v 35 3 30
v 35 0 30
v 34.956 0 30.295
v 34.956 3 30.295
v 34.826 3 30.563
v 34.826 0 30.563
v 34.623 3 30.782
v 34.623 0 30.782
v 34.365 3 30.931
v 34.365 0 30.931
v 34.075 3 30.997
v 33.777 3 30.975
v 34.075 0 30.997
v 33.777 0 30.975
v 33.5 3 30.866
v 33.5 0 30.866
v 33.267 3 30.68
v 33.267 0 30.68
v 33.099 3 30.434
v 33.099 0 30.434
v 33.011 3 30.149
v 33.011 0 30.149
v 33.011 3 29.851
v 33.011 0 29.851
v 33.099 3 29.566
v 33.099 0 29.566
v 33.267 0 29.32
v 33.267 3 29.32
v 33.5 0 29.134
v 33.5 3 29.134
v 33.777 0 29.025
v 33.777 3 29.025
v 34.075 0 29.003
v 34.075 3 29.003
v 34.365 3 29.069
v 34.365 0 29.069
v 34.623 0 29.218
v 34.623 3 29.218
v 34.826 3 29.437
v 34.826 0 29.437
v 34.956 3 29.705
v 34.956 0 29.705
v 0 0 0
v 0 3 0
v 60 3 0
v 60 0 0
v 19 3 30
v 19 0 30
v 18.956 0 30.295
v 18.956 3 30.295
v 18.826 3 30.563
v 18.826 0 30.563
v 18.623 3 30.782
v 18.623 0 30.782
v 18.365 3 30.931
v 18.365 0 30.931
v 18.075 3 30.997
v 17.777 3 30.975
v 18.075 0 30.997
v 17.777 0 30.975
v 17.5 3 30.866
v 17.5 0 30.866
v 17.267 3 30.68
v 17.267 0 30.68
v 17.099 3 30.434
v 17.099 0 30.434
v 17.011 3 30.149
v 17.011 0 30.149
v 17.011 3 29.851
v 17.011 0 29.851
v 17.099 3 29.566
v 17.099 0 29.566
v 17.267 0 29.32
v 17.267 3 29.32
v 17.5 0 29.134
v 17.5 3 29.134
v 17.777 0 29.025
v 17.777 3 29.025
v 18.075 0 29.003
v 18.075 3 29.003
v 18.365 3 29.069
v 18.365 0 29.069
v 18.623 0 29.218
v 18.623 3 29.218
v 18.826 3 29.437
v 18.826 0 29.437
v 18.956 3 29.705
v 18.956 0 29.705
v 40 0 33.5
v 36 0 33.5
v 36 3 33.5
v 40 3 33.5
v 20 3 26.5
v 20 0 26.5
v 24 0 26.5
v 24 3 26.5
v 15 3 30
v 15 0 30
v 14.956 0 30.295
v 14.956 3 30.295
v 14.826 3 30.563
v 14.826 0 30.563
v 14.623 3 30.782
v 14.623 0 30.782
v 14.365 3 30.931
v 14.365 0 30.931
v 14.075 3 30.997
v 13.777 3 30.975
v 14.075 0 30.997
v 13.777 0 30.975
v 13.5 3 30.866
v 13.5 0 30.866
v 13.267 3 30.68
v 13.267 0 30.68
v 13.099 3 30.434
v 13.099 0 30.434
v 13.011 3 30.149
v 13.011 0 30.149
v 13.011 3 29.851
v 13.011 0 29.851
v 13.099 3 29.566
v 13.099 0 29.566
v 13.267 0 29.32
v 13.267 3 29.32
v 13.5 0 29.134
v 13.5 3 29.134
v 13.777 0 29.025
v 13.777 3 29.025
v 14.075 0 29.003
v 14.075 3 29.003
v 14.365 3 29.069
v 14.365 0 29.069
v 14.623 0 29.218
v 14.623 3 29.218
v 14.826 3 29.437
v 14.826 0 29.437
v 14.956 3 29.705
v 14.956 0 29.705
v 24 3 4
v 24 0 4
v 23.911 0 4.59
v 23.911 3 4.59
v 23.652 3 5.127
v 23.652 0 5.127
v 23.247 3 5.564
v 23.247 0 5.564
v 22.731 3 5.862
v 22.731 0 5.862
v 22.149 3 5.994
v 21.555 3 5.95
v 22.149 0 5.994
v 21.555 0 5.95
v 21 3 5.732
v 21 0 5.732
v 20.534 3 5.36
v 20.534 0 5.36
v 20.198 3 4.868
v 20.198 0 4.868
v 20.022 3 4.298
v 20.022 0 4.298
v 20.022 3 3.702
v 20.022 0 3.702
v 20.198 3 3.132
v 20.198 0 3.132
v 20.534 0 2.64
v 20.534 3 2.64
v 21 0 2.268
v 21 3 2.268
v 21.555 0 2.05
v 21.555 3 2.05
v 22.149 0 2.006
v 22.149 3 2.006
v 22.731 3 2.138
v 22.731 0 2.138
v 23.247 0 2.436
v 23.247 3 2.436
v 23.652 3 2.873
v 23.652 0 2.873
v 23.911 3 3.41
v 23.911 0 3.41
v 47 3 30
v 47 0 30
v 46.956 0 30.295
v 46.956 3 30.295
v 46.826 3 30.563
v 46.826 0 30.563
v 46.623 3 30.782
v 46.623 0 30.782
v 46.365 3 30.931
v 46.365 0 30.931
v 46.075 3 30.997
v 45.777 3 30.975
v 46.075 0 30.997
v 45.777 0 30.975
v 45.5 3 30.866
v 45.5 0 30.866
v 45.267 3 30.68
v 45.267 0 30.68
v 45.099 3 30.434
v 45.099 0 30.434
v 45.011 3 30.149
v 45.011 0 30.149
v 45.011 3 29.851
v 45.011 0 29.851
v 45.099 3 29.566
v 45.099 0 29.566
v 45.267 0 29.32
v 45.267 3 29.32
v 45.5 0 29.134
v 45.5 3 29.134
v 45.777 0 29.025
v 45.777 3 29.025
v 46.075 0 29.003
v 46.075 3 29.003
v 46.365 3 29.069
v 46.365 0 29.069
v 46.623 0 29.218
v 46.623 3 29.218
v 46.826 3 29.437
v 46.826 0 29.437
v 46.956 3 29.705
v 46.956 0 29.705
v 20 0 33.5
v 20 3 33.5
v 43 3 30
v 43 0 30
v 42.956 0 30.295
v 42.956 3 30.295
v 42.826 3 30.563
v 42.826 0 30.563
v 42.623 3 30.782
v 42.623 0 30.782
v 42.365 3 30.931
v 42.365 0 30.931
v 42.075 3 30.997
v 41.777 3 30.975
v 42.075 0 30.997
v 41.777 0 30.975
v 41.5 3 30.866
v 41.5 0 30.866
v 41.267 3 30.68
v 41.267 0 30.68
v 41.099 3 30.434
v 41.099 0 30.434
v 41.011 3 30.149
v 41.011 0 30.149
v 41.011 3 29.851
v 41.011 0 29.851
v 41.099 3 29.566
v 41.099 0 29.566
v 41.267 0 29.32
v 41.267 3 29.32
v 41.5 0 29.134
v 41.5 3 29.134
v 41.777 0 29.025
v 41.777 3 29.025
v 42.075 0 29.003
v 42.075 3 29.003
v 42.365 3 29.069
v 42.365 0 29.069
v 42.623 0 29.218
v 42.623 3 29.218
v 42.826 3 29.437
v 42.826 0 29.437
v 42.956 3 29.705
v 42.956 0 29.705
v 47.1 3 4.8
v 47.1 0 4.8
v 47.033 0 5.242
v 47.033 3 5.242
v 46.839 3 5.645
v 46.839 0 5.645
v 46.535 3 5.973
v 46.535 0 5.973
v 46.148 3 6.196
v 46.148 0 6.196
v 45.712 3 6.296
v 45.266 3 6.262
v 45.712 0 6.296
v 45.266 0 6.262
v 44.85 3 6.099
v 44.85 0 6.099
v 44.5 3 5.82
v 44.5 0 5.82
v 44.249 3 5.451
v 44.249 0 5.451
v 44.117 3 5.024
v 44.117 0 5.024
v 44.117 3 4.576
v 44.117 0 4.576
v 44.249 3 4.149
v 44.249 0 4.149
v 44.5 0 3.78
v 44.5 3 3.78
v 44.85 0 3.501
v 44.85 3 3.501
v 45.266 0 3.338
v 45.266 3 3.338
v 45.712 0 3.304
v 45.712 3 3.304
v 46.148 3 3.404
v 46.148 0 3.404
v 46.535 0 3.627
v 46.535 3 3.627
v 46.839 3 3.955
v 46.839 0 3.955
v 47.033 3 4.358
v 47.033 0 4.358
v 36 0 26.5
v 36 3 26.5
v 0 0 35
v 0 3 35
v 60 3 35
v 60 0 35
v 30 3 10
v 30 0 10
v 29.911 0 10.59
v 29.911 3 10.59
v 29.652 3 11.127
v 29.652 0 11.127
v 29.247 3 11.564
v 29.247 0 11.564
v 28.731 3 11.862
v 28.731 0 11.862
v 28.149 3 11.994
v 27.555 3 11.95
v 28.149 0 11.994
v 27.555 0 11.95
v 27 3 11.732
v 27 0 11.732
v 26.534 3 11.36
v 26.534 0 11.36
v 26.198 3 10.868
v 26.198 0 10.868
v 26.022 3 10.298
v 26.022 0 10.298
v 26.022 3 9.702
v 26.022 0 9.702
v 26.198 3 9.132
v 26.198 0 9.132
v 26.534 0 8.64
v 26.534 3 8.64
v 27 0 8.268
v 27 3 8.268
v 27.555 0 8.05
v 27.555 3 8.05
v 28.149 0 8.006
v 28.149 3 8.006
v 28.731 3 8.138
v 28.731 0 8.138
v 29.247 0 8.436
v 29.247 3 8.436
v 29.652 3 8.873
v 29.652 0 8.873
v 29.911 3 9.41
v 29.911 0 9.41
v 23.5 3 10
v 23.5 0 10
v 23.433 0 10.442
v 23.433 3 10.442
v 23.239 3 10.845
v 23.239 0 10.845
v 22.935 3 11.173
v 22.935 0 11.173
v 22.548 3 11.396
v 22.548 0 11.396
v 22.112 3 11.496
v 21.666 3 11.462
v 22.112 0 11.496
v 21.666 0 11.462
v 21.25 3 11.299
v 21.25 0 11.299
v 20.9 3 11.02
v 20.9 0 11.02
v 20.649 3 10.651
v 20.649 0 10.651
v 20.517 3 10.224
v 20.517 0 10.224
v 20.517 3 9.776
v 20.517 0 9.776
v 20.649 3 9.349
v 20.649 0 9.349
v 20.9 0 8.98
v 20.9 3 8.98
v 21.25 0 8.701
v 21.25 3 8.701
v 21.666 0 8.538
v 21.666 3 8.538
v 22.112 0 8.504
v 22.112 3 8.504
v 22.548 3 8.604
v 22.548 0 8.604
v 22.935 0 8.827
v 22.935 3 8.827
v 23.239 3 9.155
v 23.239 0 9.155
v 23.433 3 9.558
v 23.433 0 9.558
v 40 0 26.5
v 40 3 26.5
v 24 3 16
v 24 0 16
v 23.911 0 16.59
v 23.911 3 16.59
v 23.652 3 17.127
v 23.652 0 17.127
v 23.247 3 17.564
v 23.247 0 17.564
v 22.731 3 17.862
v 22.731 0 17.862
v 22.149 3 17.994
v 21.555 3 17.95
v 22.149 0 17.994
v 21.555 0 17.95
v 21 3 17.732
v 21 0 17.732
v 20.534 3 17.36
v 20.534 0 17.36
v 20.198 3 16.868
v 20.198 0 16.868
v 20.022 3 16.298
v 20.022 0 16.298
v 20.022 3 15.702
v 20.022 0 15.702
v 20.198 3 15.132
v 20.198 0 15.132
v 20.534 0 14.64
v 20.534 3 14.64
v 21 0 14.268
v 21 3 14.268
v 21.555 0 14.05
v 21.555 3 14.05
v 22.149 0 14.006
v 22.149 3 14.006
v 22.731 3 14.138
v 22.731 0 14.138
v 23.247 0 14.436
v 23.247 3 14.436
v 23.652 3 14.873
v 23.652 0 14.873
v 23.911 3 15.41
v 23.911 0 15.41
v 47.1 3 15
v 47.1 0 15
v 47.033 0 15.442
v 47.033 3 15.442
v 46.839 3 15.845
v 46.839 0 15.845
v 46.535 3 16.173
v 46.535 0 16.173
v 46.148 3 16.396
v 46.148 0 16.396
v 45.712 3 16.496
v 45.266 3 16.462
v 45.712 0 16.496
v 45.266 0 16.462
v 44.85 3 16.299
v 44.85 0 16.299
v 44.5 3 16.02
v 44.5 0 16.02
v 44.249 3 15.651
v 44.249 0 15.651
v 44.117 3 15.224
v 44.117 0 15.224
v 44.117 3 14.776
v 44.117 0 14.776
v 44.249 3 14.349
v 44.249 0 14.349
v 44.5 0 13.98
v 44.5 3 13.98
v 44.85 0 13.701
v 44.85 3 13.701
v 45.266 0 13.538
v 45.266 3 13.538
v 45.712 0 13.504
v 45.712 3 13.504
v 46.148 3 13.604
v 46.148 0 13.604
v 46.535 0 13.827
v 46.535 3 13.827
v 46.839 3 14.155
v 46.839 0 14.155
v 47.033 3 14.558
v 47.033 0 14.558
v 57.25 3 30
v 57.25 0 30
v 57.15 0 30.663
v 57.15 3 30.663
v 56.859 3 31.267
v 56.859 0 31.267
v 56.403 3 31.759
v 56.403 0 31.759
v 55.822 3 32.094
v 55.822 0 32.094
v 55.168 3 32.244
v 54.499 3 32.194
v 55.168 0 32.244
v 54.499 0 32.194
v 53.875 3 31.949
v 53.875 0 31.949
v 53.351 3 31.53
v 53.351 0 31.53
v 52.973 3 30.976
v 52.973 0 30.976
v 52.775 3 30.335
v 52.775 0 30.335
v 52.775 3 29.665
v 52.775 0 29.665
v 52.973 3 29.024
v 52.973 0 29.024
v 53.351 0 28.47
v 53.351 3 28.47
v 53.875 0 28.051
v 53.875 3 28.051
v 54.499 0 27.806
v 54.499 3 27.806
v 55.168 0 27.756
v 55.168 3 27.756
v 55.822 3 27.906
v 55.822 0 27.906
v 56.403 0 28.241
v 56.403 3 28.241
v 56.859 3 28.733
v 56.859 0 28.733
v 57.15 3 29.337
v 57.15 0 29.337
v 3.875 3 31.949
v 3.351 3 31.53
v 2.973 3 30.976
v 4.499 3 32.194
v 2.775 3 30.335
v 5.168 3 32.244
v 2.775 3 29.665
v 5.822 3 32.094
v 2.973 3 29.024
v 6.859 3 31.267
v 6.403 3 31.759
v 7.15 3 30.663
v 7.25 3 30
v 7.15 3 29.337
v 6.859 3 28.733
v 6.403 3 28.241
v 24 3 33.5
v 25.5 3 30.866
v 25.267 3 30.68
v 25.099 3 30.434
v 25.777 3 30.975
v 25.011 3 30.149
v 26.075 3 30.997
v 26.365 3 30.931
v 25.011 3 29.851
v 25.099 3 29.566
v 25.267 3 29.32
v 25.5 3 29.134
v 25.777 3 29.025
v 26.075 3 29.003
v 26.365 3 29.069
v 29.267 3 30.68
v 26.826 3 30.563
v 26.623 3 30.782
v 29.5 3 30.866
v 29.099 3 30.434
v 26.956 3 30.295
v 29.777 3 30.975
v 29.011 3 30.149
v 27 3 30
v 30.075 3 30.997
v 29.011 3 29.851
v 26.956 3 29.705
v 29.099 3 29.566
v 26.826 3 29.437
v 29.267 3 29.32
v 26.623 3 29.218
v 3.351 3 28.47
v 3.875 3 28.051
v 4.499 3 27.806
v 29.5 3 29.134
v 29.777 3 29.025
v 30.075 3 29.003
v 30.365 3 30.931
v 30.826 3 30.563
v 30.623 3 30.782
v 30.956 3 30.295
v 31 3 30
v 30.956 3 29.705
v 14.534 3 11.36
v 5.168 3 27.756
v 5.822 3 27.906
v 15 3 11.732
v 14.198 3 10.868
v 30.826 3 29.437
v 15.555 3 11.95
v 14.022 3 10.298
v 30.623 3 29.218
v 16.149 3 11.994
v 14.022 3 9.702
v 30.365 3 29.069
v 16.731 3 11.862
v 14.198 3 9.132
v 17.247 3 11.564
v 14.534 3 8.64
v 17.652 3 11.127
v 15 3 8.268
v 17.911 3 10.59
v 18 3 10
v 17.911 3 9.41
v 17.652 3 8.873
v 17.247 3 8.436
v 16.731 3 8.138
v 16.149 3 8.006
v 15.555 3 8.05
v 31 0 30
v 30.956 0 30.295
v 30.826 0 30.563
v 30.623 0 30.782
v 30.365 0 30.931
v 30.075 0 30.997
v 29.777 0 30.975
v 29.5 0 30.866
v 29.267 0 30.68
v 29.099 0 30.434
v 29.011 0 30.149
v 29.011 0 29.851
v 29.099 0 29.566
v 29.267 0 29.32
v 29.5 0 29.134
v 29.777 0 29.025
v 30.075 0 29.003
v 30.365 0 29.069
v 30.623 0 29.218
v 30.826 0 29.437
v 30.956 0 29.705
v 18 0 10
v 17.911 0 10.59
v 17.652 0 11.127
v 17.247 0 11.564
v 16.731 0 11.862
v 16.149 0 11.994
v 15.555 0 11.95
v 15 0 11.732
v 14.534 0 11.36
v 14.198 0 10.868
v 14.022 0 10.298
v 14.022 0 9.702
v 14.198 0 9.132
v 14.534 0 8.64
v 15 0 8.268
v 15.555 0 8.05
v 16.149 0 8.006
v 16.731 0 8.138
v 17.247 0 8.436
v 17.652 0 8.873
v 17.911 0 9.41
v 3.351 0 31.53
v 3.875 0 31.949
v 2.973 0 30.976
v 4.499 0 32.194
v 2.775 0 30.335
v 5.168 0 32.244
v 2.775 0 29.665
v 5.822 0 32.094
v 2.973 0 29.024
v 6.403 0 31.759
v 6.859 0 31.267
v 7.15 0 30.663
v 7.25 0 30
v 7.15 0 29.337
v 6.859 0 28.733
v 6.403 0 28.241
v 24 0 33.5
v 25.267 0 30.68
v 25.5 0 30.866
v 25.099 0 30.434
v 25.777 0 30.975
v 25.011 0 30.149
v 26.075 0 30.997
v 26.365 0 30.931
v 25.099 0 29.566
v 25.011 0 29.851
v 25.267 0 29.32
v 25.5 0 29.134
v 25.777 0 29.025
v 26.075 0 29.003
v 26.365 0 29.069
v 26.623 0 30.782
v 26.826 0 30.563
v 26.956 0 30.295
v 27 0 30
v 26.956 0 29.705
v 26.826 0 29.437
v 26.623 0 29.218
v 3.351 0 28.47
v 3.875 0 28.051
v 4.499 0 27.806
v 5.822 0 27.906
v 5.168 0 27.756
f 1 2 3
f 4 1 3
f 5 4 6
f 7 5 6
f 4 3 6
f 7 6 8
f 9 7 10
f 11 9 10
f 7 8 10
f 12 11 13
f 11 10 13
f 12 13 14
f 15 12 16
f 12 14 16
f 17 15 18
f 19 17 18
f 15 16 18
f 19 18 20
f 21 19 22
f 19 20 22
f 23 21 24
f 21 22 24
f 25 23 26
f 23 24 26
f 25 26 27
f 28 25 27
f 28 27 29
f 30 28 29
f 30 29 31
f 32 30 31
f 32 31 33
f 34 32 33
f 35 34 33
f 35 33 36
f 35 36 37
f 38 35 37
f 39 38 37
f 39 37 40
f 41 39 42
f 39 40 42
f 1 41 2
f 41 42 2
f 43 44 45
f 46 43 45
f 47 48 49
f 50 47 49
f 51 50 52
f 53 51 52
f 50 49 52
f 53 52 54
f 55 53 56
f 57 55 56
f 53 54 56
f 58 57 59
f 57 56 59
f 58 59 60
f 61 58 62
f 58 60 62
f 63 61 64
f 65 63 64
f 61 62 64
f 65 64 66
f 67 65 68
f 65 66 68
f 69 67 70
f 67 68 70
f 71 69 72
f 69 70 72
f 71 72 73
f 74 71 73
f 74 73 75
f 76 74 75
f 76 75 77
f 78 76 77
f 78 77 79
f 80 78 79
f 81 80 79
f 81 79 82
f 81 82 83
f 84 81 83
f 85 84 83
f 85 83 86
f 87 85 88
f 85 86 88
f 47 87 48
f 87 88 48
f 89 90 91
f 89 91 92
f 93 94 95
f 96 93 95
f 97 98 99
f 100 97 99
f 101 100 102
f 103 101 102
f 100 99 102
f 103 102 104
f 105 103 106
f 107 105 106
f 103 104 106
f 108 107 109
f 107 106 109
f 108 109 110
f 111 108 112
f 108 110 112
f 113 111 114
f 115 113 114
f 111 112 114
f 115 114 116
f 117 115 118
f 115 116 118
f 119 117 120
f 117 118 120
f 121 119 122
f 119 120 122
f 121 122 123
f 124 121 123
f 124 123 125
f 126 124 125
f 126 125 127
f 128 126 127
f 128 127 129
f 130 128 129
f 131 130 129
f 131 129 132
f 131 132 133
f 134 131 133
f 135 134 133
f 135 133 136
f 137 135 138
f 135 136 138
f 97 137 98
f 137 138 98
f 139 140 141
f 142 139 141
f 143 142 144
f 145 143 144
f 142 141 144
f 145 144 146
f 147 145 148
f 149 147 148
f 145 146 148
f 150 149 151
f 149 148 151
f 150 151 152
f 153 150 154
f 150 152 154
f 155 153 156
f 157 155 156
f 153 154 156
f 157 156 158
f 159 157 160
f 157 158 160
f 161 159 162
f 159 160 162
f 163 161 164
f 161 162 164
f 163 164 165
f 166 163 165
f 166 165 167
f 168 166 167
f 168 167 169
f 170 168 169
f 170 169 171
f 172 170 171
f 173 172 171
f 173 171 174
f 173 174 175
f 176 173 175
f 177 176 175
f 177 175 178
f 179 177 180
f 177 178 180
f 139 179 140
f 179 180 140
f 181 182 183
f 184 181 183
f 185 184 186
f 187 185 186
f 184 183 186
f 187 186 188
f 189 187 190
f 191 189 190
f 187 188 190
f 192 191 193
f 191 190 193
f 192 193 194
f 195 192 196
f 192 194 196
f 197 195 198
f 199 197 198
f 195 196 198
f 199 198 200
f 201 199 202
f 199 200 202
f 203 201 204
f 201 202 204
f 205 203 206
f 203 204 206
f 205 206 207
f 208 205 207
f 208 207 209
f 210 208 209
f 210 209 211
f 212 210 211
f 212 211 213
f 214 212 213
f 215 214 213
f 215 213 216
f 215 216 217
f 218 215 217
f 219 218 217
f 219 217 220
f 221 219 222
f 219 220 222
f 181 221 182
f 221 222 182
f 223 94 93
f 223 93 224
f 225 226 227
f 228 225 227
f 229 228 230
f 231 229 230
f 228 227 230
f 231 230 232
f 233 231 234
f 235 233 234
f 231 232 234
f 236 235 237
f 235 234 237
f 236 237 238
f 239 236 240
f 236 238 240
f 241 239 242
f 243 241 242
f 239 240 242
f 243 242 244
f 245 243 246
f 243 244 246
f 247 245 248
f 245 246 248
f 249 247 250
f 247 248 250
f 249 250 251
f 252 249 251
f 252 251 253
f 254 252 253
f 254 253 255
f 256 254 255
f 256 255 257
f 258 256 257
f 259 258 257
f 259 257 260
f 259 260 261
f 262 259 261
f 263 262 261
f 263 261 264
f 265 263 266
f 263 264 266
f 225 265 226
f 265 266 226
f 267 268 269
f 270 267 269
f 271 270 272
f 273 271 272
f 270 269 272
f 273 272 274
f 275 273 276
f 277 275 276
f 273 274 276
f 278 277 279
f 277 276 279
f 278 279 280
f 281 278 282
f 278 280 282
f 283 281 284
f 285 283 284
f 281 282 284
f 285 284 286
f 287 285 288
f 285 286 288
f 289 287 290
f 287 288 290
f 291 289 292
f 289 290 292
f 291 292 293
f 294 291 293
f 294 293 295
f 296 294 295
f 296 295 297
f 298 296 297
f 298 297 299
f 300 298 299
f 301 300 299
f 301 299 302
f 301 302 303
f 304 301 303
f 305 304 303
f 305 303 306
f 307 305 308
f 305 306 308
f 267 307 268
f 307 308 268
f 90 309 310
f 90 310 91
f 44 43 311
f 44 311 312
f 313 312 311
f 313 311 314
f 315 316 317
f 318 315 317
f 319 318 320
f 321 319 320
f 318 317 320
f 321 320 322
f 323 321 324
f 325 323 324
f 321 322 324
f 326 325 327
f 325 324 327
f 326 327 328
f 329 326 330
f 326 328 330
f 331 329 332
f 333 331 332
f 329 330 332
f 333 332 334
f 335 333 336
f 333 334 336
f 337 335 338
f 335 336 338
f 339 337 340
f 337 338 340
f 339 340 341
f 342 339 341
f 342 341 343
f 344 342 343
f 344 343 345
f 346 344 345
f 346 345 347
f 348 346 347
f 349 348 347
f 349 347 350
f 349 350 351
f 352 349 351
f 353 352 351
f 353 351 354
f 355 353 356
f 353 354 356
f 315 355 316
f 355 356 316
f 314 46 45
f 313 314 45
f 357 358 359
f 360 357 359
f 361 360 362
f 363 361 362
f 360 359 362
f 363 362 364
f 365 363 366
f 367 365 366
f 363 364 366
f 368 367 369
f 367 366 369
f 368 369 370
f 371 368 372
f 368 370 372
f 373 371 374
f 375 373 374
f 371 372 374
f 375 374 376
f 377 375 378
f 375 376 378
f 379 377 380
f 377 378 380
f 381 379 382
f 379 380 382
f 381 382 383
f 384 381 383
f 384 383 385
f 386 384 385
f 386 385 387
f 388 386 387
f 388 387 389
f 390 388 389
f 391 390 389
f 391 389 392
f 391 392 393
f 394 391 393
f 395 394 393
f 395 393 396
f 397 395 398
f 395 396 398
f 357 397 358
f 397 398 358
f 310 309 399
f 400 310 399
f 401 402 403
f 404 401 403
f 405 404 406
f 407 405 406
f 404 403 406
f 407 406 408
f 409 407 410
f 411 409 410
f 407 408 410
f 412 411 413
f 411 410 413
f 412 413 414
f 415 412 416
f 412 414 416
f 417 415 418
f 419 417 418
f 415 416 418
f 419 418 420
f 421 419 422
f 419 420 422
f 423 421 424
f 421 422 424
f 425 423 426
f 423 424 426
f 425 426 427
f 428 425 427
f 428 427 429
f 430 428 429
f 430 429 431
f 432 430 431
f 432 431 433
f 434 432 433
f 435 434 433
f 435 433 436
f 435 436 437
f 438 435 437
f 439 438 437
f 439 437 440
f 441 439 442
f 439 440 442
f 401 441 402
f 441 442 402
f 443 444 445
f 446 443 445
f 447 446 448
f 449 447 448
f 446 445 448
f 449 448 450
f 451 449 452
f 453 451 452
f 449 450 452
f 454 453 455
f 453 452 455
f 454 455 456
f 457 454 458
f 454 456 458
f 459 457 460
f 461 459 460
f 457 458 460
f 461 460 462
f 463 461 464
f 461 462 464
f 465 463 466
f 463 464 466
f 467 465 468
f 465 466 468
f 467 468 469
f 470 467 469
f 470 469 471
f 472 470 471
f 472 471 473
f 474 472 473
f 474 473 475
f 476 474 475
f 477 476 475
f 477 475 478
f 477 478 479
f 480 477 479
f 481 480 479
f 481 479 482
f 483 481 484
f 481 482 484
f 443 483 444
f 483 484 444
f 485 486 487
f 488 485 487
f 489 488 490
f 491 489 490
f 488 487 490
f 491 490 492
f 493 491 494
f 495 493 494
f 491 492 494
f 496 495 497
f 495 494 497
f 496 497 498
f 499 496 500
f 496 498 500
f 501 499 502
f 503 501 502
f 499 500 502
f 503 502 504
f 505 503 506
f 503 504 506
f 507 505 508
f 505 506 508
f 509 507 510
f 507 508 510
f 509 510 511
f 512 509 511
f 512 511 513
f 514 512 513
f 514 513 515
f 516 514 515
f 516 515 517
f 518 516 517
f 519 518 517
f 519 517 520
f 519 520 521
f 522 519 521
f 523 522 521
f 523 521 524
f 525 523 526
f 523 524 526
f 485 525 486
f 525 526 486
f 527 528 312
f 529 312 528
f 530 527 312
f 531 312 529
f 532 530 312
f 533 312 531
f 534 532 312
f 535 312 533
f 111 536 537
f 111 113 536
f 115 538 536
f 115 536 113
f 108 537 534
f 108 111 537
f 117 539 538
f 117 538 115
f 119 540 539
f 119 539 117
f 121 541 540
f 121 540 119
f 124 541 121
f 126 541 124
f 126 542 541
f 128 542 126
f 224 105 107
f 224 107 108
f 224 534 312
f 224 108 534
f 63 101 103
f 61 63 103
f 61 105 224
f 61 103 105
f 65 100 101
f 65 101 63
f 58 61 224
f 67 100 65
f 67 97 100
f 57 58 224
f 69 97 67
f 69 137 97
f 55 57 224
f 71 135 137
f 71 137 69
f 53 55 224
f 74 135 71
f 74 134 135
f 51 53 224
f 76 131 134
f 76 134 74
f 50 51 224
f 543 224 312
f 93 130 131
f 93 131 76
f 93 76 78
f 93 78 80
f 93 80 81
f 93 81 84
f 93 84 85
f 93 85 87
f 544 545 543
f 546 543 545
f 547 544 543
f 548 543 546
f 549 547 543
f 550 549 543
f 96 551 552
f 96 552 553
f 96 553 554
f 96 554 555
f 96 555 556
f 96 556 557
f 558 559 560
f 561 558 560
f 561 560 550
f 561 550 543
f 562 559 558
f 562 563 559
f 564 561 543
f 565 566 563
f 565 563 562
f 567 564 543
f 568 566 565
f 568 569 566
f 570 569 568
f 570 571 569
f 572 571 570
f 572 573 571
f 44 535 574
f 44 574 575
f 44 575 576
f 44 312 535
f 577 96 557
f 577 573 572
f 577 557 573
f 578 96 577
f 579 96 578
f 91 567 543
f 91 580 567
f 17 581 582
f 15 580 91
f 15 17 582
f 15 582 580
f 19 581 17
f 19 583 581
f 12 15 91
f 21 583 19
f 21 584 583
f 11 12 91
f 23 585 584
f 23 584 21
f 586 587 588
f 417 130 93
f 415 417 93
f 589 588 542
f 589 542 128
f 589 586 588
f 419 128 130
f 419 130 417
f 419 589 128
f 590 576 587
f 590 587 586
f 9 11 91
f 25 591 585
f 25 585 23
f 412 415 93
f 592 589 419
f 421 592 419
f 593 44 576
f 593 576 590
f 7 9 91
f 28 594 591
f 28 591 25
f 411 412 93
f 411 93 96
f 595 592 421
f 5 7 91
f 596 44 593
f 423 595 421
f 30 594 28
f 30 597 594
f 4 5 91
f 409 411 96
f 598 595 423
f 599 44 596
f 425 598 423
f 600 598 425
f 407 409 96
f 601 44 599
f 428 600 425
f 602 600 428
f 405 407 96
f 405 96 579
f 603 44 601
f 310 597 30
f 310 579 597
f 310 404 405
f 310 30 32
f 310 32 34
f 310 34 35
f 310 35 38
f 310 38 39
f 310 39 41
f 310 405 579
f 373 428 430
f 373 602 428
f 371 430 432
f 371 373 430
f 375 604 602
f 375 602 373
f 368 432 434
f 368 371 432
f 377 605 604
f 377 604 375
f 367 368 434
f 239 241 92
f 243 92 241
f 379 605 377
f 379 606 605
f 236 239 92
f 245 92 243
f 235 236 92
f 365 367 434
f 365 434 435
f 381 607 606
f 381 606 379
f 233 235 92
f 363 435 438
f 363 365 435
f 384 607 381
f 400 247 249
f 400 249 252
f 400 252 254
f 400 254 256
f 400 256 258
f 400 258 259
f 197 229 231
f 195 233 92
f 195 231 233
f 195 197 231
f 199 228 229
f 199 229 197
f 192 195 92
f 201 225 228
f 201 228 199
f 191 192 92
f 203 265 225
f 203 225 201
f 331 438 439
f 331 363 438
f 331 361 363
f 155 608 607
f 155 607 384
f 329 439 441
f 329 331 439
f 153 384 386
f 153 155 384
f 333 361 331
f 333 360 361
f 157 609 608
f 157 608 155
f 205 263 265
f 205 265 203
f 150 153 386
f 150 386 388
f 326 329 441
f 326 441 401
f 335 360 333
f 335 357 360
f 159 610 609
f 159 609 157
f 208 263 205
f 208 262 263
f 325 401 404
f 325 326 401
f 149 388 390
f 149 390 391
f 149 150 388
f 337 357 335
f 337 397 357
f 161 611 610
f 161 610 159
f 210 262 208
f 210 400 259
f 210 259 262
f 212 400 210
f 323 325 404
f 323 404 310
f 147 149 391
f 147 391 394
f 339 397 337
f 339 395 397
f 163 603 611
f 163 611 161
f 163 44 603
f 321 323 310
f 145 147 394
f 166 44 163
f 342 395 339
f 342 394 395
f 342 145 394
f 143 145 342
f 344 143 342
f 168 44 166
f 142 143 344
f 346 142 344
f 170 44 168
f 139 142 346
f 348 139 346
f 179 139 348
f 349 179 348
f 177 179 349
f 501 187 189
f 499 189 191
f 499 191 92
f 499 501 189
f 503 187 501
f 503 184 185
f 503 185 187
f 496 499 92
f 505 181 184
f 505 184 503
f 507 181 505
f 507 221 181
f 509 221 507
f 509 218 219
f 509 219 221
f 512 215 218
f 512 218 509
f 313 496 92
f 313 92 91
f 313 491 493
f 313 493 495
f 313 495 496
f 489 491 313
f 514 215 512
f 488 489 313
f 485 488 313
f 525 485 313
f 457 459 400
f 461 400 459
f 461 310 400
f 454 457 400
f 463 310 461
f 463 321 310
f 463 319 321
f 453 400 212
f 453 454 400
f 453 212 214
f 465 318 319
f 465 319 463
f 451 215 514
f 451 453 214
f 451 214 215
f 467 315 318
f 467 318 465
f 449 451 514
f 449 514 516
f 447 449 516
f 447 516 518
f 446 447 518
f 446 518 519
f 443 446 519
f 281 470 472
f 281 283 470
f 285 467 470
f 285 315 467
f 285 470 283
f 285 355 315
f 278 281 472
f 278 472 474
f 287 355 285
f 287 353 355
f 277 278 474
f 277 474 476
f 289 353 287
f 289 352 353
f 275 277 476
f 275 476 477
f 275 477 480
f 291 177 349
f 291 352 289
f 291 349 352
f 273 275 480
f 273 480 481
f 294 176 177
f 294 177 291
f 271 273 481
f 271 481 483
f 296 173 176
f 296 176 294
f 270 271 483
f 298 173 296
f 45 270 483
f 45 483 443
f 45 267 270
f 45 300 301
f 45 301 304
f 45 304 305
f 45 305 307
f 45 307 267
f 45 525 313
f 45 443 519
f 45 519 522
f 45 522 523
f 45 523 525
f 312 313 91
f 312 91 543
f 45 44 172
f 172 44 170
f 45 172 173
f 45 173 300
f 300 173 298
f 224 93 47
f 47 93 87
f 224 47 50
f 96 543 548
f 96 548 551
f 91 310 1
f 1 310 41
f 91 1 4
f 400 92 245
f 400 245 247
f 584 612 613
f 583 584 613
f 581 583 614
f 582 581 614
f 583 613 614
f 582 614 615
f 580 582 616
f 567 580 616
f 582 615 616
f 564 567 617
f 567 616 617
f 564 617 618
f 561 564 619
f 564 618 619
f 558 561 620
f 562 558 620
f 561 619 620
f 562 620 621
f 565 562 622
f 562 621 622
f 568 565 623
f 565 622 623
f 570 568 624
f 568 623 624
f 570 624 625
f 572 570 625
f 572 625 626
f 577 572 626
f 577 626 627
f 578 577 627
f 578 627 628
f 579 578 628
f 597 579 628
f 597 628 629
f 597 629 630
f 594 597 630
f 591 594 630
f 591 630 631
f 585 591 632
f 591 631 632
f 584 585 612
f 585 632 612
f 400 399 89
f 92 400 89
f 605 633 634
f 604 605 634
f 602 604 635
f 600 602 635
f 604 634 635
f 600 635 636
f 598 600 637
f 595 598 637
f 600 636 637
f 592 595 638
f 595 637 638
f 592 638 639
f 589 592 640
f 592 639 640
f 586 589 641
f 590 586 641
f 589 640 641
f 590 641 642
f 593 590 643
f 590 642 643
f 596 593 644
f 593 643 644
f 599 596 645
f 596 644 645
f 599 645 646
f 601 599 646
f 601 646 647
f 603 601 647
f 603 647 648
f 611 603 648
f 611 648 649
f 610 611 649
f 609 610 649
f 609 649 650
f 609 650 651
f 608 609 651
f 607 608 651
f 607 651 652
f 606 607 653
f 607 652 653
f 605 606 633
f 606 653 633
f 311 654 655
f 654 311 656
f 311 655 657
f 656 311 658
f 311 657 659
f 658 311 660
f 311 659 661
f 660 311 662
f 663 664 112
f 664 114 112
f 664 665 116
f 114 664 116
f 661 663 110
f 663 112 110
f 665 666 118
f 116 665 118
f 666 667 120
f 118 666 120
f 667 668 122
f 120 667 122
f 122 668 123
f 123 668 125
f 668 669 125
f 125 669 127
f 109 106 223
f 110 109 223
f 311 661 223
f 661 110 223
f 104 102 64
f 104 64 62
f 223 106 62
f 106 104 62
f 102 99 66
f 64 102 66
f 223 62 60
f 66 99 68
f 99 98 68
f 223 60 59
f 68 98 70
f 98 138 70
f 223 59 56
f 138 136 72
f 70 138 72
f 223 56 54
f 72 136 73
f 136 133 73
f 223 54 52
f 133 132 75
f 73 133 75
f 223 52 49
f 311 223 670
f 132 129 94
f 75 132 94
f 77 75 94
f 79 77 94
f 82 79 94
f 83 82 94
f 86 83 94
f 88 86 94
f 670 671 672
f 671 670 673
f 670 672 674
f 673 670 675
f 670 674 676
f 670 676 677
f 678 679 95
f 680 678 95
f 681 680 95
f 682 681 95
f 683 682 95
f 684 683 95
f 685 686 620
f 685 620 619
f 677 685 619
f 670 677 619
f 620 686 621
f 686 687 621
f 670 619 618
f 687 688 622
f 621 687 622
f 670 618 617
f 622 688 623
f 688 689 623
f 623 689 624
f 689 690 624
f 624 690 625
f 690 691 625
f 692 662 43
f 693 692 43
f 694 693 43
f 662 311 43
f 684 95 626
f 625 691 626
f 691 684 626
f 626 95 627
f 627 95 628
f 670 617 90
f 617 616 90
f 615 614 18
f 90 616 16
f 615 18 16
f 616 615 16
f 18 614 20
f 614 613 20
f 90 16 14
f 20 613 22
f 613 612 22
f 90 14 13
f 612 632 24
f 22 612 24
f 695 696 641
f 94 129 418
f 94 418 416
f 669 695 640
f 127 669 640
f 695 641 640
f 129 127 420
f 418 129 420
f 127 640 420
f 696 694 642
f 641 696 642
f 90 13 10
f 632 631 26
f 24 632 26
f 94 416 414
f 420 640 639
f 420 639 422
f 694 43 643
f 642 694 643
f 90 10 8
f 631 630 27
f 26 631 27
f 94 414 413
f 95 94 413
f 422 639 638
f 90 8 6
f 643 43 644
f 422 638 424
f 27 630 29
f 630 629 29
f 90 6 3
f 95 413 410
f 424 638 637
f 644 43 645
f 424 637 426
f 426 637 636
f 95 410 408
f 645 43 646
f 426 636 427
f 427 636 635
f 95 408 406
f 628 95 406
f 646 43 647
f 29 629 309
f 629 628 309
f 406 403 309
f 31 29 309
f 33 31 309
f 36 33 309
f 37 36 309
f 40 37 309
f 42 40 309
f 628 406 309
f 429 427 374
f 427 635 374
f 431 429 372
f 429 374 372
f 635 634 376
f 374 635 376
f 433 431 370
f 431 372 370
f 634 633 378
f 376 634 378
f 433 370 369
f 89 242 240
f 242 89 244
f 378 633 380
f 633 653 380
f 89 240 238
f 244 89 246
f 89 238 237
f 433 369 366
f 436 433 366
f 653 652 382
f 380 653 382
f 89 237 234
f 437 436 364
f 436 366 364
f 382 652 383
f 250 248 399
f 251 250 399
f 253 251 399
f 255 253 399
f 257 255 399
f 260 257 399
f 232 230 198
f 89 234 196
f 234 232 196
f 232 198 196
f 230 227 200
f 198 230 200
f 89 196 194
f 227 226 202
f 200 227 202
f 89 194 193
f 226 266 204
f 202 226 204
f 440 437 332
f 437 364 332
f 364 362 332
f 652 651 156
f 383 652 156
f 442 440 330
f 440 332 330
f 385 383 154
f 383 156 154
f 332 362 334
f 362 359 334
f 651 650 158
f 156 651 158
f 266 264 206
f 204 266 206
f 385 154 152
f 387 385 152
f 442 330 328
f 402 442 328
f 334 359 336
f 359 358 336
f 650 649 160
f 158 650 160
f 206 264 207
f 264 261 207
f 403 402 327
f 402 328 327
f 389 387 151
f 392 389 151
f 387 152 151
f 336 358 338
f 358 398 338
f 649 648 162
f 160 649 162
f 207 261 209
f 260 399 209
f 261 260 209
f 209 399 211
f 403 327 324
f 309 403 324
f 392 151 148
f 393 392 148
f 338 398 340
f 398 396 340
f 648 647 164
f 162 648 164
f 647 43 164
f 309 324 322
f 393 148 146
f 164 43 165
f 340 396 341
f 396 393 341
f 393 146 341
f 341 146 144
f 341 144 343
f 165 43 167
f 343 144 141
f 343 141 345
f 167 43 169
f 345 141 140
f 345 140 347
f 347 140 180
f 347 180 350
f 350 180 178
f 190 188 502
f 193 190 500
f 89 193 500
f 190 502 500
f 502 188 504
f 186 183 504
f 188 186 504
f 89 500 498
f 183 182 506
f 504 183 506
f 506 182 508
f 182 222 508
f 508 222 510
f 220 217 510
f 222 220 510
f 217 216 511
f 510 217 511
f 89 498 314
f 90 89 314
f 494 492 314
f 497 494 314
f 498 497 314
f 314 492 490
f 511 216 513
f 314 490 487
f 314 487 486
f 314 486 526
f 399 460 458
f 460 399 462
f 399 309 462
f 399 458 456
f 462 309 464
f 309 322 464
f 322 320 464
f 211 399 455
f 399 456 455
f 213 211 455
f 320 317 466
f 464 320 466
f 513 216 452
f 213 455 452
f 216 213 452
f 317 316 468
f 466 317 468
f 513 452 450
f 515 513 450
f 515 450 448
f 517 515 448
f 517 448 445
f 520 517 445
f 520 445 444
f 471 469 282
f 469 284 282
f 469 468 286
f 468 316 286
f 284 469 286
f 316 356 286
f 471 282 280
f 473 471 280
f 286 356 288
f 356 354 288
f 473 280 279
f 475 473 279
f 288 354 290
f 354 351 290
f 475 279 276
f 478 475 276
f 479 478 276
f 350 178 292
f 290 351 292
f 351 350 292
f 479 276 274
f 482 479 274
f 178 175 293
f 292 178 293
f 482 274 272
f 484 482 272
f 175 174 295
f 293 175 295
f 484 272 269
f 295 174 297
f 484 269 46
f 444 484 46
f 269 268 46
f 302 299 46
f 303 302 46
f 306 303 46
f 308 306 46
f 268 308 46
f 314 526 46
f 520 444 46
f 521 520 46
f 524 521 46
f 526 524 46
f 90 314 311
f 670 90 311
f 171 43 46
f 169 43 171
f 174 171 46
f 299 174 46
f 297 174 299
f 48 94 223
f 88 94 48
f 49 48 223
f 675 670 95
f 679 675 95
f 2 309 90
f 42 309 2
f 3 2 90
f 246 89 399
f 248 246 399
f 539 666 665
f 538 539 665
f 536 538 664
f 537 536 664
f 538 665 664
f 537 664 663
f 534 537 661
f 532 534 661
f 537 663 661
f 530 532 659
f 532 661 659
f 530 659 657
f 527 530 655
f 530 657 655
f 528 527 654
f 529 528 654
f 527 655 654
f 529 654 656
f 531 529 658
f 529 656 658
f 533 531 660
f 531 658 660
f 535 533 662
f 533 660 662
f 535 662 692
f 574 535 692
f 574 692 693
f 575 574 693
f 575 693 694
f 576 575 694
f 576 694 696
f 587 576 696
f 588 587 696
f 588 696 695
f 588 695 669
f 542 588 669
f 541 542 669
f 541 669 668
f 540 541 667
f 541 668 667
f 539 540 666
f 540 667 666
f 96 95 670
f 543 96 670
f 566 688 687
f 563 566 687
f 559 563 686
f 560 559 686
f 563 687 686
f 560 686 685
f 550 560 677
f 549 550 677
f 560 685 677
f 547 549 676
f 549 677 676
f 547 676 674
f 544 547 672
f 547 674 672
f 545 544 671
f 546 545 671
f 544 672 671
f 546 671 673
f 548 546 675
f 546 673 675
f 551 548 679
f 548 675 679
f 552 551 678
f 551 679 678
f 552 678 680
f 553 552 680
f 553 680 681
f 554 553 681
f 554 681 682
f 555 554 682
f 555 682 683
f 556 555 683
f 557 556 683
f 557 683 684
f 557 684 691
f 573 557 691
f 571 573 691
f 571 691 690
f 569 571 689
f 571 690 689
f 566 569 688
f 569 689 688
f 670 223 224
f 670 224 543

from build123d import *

# Parameters (mm, degrees)
SKETCH_W      = 60
SKETCH_H      = 3
PAD_DEPTH     = 35
SKETCH001_R   = 1.5
SKETCH001_R_2 = 2
SKETCH001_R_3 = 2.25
SKETCH001_R_4 = 1
SKETCH001_W   = 4
SKETCH001_H   = 7
POCKET_DEPTH  = 3


with BuildPart() as part:
    # Sketch → Pad (new body)
    with BuildSketch(Plane.XY):
        with Locations((30, 1.5)):
            Rectangle(SKETCH_W, SKETCH_H)
    extrude(amount=PAD_DEPTH)

    # Sketch001 → Pocket (cut)
    with BuildSketch(Plane.XZ):
        with Locations((22, 10)):
            Circle(SKETCH001_R)
        with Locations((28, 10)):
            Circle(SKETCH001_R_2)
        with Locations((22, 16)):
            Circle(SKETCH001_R_2)
        with Locations((16, 10)):
            Circle(SKETCH001_R_2)
        with Locations((22, 4)):
            Circle(SKETCH001_R_2)
        with Locations((5, 30)):
            Circle(SKETCH001_R_3)
        with Locations((55, 30)):
            Circle(SKETCH001_R_3)
        with Locations((14, 30)):
            Circle(SKETCH001_R_4)
        with Locations((18, 30)):
            Circle(SKETCH001_R_4)
        with Locations((26, 30)):
            Circle(SKETCH001_R_4)
        with Locations((30, 30)):
            Circle(SKETCH001_R_4)
        with Locations((34, 30)):
            Circle(SKETCH001_R_4)
        with Locations((42, 30)):
            Circle(SKETCH001_R_4)
        with Locations((46, 30)):
            Circle(SKETCH001_R_4)
        with Locations((45.6, 15)):
            Circle(SKETCH001_R)
        with Locations((45.6, 4.8)):
            Circle(SKETCH001_R)
        with Locations((22, 30)):
            Rectangle(SKETCH001_W, SKETCH001_H)
        with Locations((38, 30)):
            Rectangle(SKETCH001_W, SKETCH001_H)
    extrude(amount=-POCKET_DEPTH, mode=Mode.SUBTRACT)


solid = part.part
